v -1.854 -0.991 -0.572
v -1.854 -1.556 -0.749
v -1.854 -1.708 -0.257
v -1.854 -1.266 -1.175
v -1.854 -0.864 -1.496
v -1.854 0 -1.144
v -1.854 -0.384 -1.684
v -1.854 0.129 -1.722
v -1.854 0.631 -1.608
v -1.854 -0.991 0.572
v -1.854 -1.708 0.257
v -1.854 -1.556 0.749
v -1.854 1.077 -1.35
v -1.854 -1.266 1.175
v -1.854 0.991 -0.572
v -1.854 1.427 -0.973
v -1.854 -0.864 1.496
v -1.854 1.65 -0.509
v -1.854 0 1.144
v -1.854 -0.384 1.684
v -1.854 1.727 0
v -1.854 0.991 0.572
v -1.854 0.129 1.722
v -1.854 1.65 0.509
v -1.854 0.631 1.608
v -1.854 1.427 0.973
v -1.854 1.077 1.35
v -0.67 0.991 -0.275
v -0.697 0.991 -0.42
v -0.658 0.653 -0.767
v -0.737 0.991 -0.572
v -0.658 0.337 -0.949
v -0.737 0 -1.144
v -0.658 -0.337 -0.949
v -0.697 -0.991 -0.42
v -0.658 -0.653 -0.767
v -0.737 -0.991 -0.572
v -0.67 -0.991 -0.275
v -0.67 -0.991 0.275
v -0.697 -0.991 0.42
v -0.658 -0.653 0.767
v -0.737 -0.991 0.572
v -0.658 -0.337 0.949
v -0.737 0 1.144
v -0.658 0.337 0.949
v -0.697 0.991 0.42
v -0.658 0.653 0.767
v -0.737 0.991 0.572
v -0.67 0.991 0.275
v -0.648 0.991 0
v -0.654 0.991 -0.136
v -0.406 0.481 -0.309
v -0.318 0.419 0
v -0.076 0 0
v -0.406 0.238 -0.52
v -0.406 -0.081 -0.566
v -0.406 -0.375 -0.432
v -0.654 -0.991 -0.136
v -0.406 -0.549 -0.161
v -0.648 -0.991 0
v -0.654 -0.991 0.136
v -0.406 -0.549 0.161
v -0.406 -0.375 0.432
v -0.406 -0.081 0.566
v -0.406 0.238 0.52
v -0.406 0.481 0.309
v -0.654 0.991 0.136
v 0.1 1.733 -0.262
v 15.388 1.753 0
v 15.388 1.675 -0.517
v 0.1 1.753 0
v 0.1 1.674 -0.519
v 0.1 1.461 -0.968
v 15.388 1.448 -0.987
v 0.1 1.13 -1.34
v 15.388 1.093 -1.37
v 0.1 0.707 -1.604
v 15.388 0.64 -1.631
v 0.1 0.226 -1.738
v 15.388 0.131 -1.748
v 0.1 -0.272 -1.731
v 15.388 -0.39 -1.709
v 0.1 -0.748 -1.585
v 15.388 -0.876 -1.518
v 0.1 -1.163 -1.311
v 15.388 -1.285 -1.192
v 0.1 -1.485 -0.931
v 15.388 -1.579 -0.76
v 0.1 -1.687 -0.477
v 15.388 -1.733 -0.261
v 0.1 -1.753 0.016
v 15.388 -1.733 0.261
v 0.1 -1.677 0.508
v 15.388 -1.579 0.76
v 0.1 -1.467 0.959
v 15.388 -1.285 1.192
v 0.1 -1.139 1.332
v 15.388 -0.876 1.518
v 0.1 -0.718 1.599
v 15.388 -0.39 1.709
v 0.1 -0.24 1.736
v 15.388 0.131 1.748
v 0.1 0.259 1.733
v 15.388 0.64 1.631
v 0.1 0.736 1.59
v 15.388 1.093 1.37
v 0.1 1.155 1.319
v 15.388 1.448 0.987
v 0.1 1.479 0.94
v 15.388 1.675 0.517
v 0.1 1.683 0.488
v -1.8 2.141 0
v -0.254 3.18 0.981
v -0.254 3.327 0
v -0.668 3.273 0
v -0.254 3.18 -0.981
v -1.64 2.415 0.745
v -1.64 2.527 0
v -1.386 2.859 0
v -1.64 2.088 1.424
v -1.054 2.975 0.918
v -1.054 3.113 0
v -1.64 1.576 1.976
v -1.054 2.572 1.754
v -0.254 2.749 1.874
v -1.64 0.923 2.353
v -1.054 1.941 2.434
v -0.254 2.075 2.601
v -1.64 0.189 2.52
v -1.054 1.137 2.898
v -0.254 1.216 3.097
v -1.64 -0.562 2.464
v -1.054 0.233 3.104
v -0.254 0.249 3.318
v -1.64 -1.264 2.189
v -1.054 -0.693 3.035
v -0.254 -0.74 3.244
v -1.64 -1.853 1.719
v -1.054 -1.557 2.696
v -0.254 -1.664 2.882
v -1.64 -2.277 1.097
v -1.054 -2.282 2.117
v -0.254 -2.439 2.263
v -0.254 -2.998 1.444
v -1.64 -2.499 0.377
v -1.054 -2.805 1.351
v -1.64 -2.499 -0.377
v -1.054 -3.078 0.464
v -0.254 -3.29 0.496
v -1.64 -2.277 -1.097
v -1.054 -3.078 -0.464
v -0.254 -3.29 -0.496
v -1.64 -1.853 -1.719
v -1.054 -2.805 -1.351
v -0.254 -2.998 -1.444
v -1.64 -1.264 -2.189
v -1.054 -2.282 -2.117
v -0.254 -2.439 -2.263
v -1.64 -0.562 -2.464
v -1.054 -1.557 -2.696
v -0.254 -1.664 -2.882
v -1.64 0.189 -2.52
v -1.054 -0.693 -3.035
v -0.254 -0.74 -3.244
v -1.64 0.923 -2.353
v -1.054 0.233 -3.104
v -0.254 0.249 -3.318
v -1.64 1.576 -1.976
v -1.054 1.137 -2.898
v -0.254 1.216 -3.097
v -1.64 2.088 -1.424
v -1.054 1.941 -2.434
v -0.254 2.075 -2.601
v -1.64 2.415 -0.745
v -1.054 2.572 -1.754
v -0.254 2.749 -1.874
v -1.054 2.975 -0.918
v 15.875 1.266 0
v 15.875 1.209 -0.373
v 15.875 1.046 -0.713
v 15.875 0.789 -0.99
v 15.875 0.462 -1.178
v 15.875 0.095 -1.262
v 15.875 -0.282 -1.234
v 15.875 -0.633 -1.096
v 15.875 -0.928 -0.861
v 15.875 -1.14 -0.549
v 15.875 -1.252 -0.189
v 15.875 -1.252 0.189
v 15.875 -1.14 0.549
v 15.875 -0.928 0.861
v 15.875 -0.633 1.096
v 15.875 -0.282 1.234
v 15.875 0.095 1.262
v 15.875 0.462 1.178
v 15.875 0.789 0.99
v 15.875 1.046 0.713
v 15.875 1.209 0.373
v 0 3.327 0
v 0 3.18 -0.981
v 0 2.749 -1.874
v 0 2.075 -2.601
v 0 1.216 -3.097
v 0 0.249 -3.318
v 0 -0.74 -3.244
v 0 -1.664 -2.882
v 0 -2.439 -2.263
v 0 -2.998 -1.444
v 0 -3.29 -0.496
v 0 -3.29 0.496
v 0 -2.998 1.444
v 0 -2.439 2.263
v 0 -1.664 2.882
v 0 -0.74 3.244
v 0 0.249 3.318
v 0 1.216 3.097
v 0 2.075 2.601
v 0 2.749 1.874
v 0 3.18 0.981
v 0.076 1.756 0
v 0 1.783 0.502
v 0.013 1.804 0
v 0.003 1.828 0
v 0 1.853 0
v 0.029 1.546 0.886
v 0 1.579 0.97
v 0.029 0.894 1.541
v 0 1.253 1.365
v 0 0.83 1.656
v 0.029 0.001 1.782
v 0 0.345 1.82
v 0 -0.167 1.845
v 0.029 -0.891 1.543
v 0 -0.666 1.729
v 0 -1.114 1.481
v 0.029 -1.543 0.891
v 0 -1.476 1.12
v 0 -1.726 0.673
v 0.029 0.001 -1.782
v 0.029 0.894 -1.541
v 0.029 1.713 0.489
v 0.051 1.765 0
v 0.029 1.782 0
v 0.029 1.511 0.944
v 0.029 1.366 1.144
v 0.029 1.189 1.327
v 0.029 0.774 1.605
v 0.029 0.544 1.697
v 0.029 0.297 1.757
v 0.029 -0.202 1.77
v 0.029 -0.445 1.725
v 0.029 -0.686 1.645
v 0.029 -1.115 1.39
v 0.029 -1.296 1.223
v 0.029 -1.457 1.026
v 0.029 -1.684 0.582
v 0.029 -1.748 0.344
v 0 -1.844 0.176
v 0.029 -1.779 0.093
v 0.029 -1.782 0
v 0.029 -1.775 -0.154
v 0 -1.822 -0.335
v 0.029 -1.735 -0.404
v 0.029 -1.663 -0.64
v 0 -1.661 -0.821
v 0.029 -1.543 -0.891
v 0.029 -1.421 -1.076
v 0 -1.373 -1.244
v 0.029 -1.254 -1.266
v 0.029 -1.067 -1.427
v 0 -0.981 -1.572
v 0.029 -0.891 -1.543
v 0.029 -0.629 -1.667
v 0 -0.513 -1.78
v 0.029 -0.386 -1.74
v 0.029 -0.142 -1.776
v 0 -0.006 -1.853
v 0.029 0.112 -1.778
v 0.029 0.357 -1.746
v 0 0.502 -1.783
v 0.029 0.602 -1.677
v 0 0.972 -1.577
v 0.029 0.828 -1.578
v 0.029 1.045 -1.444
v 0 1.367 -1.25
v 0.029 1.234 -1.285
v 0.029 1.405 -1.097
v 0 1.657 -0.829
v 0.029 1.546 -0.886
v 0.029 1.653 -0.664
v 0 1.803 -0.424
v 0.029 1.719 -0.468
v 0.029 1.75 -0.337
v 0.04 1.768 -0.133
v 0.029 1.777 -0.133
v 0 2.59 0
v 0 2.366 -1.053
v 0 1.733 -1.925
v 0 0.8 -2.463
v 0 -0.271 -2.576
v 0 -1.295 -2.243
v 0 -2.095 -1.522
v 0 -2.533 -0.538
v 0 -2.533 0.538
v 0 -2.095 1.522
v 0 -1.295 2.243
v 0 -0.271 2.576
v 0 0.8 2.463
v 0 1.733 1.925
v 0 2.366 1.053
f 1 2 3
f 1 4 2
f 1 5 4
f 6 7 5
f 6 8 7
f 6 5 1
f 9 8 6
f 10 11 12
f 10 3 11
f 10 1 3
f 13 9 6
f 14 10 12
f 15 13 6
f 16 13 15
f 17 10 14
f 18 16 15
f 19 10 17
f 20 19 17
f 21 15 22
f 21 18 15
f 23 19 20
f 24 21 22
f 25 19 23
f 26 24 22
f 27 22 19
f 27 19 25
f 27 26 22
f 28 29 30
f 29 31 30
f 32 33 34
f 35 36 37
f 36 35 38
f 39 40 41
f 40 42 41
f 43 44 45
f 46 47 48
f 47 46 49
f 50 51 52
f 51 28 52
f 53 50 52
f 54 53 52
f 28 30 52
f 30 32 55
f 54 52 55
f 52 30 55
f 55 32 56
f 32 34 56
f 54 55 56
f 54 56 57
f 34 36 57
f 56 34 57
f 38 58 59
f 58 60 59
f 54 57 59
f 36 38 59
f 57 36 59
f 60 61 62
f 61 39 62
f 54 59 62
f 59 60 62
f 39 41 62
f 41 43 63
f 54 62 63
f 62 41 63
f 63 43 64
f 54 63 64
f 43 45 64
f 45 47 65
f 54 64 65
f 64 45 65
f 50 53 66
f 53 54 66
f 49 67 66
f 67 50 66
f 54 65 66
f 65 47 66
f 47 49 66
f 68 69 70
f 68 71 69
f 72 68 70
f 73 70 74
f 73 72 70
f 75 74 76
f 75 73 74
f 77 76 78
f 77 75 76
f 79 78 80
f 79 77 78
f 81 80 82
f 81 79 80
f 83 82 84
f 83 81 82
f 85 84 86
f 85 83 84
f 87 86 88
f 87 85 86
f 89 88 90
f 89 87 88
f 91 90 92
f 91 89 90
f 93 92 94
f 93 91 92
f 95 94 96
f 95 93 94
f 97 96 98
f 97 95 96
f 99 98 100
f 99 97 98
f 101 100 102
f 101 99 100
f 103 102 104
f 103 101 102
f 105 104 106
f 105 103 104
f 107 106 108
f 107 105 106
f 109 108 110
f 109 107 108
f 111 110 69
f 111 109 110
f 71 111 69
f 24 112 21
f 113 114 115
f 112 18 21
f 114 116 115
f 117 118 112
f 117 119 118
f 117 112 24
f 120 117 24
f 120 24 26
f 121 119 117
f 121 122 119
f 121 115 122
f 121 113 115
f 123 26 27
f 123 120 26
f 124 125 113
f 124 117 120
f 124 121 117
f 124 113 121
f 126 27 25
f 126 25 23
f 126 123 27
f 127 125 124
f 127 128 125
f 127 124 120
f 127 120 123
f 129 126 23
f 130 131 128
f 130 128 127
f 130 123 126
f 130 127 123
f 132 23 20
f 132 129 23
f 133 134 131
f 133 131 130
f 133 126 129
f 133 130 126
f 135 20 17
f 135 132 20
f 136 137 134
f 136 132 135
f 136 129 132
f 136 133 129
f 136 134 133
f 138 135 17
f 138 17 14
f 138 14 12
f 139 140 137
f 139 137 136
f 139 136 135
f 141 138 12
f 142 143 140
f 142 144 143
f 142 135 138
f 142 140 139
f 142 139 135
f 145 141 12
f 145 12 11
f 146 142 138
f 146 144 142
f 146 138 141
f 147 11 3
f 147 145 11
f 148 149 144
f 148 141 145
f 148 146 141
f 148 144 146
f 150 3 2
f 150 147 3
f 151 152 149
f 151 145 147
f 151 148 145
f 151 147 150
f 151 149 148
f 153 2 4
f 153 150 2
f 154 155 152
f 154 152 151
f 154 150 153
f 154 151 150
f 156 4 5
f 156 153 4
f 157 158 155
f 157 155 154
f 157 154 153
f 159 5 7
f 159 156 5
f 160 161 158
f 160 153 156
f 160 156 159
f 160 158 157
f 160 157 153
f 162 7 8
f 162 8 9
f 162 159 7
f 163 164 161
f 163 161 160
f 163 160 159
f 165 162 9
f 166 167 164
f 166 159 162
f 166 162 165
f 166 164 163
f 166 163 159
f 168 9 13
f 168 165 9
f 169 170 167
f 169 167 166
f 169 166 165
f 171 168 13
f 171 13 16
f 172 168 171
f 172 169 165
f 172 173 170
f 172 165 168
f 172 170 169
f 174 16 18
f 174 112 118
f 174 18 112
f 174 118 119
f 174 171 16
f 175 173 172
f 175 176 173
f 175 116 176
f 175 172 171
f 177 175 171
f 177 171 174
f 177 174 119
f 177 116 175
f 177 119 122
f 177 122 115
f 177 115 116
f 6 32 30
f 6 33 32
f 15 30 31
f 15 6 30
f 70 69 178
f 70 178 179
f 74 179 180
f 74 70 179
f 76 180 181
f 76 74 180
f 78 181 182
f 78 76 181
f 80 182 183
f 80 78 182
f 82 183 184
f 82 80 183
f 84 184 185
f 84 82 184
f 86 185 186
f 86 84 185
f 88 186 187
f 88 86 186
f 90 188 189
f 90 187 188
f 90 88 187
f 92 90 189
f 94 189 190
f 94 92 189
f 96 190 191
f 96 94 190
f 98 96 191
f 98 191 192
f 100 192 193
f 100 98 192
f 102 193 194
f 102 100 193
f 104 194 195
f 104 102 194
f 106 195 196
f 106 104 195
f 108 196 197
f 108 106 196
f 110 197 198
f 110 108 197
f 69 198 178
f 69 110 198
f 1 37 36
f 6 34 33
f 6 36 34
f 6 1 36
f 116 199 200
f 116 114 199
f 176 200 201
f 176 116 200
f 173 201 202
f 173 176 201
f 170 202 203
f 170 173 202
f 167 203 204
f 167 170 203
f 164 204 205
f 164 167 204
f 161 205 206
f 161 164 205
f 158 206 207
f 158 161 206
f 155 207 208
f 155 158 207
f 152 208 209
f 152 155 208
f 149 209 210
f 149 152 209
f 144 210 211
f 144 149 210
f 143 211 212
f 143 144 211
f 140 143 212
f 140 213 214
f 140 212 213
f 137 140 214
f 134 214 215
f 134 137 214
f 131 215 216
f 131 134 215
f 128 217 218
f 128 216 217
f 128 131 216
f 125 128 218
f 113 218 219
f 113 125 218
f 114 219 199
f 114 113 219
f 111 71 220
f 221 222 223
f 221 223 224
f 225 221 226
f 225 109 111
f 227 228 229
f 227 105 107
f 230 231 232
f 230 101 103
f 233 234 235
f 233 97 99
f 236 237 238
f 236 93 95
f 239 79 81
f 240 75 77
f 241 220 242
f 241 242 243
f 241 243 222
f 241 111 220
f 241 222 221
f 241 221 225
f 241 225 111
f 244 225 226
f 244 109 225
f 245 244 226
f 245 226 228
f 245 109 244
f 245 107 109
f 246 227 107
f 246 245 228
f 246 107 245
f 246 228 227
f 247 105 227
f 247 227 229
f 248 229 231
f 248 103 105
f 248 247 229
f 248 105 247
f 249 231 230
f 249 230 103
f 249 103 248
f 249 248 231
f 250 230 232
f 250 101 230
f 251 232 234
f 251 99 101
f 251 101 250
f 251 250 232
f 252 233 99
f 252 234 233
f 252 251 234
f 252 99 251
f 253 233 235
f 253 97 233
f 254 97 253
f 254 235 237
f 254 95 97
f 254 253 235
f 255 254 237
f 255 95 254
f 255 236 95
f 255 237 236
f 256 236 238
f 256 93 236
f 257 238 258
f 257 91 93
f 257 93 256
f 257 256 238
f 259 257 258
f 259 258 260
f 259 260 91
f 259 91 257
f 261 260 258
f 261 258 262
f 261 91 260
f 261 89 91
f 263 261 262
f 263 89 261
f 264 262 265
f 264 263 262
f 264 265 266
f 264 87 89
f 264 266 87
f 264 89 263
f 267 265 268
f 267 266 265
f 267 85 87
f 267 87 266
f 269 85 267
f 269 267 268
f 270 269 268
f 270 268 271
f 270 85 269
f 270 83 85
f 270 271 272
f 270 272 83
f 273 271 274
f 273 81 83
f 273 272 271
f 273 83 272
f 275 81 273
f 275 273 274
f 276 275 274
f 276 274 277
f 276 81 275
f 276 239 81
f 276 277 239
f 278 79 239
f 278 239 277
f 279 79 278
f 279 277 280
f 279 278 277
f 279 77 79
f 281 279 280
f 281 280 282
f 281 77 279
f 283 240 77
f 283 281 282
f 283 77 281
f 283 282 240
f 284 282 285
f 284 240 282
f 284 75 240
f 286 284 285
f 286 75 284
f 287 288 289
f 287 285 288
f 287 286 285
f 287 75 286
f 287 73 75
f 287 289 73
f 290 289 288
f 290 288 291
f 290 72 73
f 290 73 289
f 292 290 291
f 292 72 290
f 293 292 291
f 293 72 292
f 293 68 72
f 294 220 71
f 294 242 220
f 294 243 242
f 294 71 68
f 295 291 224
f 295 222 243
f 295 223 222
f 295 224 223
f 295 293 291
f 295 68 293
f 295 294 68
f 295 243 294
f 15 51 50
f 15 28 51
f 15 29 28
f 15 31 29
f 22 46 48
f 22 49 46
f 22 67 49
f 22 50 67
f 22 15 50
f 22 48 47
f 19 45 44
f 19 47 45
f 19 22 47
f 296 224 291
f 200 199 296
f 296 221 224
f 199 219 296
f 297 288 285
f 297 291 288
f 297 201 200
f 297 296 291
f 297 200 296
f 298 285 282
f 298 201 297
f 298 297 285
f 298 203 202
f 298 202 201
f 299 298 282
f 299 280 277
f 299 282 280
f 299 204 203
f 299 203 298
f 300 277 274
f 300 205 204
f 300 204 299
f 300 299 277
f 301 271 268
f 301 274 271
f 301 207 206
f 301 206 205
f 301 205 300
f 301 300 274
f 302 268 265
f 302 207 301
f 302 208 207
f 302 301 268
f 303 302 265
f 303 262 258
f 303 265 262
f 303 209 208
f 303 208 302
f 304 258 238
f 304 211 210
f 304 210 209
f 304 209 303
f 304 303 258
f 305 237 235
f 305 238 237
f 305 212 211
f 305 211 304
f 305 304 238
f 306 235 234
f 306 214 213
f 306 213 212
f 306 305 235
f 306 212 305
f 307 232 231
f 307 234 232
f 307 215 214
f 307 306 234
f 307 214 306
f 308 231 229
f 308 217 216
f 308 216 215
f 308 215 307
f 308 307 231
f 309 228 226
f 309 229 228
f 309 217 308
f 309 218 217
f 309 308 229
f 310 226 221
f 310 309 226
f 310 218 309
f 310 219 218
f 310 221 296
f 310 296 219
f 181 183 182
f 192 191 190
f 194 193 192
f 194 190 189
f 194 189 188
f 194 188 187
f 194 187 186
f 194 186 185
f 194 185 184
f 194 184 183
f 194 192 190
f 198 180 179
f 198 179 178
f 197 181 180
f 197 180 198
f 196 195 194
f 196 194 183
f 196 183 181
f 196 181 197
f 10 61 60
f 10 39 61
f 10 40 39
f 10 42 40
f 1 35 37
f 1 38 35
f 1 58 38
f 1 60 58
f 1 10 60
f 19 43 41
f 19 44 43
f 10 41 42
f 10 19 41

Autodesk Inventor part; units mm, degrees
ref_plane "YZ Plane" through (0, 0, 0) normal (1, 0, 0) x (0, 1, 0)
ref_plane "XZ Plane" through (0, 0, 0) normal (0, 1, 0) x (-1, 0, 0)
sketch "Sketch1" plane through (0, 0, 0) normal (0, 0, 1) x (1, 0, 0)
  line L0 (-0.0762, 0) -> (15.875, 0)
  line L1 (15.875, 0) -> (15.875, 1.7526)
  line L2 (15.875, 1.7526) -> (1.5902, 1.7526)
  line L3 (1.5902, 1.7526) -> (0.0001, 1.7526)
  line L4 (0.0001, 1.7526) -> (0, 1.7526)
  line L5 (0, 1.7526) -> (0, 3.3274)
  line L6 (0, 3.3274) -> (-1.8542, 3.3274)
  line L7 (-1.8542, 3.3274) -> (-1.8542, 1.1438)
  line L8 (-1.8542, 1.1438) -> (-0.7366, 1.1438)
  line L9 (-0.7366, 1.1438) -> (-0.0762, 0)
  line L10 (-5.4, 0) -> (19.4208, 0) projected
  line L11 (0, -0.6655) -> (0, 3.9929) projected
  line L12 (1.5902, 1.7526) -> (0, 1.7526) construction
  dimension "d1" = 14.2848
  dimension "d2" = 1.5901
  dimension "d3" = 1.8542
  dimension "d4" = 1.1176
  dimension "d5" = 60
  dimension "d6" = 3.5052
  dimension "d7" = 3.5052
  dimension "d8" = 2.2877
  dimension "d9" = 6.6548
  dimension "d26" = 15.875
revolve "Body" add sketch "Sketch1" angle 360 about axis through (-0.0762, 0, 0) along (1, 0, 0)
sketch "Sketch2" plane through (-1.8542, 0, 0) normal (-1, 0, 0) x (0, 0, 1)
  circle A0 centre (0, 0) radius 1.1438 projected
  line L0 (0, -4.6584) -> (0, 4.6584) projected
  line L1 (-4.6584, 0) -> (4.6584, 0) projected
  line L2 (1.1438, 0) -> (0.5719, -0.9906)
  line L3 (0.5719, -0.9906) -> (-0.5719, -0.9906)
  line L4 (-0.5719, -0.9906) -> (-1.1438, 0)
  line L5 (-1.1438, 0) -> (-0.5719, 0.9906)
  line L6 (-0.5719, 0.9906) -> (0.5719, 0.9906)
  line L7 (0.5719, 0.9906) -> (1.1438, 0)
extrude "Slot" add sketch "Sketch2" against normal up to next contours L7 A0 | A0 L2 | L6 L0 A0 | A0 L0 L3 | L0 L6 A0 | A0 L3 L0 | L4 A0 | A0 L5
fillet "Fillet1" radius 1.6002 1 edges at (-1.8542, -3.3274, 0)
thread "Thread" size "6-32 UNC" class "2A" standard "ANSI Unified Screw Threads" length 14.2848
chamfer "Chamfer1" distance 0.4869 distance2 0.4869 1 edges at (15.875, -1.7526, 0) measured on face at (15.875, -0.5973, -0.3874)
ref_plane "Work Plane1" through (29, 0, 0) normal (0, -1, 0) x (1, 0, 0)
fillet "Fillet2" radius 0.1 1 edges at (0.0001, -1.7526, 0)
equation "\"d1\" = GEL"
equation "\"d3\" = KOH"
equation "\"d4\" = INTI"
equation "\"d6\" = GD"
equation "\"d7\" = BDM"
equation "\"d8\" = 1.1547 * SW"
equation "\"d9\" = KOD"
equation "\"d26\" = NLG"
equation "\"d30\" = R"
equation "\"d17\" = RR"
equation "\"d13\" = GEL"
equation "\"d15\" = -0.5 * SPD + 0.5 * GD"
equation "\"d16\" = GUL"
equation "\"GD\" = NND"
equation "\"NLG\" = 15.875"
equation "\"GEL\" = 14.28476"
equation "\"KOD\" = 6.6548"
equation "\"KOH\" = 1.8542"
equation "\"INTI\" = 1.1176"
equation "\"GAL\" = 1.59004"
equation "\"GUL\" = 0.48692"
equation "\"BDM\" = NND"
equation "\"SW\" = 1.9812"
equation "\"RR\" = 1.6002"
equation "\"SPD\" = 2.53136"
equation "\"R\" = 0.1"
equation "\"TOA\" = 30deg"
equation "\"GD1\" = SPD"
equation "\"THREADDIA\" = 3.5052"
equation "\"KOH1\" = 0.381"
equation "\"NND\" = 3.5052"
equation "\"E0\" = 2.28829"
properties part number "ANSI B18.3 - 6 - 32 x 5/8" material "Steel, Mild"
